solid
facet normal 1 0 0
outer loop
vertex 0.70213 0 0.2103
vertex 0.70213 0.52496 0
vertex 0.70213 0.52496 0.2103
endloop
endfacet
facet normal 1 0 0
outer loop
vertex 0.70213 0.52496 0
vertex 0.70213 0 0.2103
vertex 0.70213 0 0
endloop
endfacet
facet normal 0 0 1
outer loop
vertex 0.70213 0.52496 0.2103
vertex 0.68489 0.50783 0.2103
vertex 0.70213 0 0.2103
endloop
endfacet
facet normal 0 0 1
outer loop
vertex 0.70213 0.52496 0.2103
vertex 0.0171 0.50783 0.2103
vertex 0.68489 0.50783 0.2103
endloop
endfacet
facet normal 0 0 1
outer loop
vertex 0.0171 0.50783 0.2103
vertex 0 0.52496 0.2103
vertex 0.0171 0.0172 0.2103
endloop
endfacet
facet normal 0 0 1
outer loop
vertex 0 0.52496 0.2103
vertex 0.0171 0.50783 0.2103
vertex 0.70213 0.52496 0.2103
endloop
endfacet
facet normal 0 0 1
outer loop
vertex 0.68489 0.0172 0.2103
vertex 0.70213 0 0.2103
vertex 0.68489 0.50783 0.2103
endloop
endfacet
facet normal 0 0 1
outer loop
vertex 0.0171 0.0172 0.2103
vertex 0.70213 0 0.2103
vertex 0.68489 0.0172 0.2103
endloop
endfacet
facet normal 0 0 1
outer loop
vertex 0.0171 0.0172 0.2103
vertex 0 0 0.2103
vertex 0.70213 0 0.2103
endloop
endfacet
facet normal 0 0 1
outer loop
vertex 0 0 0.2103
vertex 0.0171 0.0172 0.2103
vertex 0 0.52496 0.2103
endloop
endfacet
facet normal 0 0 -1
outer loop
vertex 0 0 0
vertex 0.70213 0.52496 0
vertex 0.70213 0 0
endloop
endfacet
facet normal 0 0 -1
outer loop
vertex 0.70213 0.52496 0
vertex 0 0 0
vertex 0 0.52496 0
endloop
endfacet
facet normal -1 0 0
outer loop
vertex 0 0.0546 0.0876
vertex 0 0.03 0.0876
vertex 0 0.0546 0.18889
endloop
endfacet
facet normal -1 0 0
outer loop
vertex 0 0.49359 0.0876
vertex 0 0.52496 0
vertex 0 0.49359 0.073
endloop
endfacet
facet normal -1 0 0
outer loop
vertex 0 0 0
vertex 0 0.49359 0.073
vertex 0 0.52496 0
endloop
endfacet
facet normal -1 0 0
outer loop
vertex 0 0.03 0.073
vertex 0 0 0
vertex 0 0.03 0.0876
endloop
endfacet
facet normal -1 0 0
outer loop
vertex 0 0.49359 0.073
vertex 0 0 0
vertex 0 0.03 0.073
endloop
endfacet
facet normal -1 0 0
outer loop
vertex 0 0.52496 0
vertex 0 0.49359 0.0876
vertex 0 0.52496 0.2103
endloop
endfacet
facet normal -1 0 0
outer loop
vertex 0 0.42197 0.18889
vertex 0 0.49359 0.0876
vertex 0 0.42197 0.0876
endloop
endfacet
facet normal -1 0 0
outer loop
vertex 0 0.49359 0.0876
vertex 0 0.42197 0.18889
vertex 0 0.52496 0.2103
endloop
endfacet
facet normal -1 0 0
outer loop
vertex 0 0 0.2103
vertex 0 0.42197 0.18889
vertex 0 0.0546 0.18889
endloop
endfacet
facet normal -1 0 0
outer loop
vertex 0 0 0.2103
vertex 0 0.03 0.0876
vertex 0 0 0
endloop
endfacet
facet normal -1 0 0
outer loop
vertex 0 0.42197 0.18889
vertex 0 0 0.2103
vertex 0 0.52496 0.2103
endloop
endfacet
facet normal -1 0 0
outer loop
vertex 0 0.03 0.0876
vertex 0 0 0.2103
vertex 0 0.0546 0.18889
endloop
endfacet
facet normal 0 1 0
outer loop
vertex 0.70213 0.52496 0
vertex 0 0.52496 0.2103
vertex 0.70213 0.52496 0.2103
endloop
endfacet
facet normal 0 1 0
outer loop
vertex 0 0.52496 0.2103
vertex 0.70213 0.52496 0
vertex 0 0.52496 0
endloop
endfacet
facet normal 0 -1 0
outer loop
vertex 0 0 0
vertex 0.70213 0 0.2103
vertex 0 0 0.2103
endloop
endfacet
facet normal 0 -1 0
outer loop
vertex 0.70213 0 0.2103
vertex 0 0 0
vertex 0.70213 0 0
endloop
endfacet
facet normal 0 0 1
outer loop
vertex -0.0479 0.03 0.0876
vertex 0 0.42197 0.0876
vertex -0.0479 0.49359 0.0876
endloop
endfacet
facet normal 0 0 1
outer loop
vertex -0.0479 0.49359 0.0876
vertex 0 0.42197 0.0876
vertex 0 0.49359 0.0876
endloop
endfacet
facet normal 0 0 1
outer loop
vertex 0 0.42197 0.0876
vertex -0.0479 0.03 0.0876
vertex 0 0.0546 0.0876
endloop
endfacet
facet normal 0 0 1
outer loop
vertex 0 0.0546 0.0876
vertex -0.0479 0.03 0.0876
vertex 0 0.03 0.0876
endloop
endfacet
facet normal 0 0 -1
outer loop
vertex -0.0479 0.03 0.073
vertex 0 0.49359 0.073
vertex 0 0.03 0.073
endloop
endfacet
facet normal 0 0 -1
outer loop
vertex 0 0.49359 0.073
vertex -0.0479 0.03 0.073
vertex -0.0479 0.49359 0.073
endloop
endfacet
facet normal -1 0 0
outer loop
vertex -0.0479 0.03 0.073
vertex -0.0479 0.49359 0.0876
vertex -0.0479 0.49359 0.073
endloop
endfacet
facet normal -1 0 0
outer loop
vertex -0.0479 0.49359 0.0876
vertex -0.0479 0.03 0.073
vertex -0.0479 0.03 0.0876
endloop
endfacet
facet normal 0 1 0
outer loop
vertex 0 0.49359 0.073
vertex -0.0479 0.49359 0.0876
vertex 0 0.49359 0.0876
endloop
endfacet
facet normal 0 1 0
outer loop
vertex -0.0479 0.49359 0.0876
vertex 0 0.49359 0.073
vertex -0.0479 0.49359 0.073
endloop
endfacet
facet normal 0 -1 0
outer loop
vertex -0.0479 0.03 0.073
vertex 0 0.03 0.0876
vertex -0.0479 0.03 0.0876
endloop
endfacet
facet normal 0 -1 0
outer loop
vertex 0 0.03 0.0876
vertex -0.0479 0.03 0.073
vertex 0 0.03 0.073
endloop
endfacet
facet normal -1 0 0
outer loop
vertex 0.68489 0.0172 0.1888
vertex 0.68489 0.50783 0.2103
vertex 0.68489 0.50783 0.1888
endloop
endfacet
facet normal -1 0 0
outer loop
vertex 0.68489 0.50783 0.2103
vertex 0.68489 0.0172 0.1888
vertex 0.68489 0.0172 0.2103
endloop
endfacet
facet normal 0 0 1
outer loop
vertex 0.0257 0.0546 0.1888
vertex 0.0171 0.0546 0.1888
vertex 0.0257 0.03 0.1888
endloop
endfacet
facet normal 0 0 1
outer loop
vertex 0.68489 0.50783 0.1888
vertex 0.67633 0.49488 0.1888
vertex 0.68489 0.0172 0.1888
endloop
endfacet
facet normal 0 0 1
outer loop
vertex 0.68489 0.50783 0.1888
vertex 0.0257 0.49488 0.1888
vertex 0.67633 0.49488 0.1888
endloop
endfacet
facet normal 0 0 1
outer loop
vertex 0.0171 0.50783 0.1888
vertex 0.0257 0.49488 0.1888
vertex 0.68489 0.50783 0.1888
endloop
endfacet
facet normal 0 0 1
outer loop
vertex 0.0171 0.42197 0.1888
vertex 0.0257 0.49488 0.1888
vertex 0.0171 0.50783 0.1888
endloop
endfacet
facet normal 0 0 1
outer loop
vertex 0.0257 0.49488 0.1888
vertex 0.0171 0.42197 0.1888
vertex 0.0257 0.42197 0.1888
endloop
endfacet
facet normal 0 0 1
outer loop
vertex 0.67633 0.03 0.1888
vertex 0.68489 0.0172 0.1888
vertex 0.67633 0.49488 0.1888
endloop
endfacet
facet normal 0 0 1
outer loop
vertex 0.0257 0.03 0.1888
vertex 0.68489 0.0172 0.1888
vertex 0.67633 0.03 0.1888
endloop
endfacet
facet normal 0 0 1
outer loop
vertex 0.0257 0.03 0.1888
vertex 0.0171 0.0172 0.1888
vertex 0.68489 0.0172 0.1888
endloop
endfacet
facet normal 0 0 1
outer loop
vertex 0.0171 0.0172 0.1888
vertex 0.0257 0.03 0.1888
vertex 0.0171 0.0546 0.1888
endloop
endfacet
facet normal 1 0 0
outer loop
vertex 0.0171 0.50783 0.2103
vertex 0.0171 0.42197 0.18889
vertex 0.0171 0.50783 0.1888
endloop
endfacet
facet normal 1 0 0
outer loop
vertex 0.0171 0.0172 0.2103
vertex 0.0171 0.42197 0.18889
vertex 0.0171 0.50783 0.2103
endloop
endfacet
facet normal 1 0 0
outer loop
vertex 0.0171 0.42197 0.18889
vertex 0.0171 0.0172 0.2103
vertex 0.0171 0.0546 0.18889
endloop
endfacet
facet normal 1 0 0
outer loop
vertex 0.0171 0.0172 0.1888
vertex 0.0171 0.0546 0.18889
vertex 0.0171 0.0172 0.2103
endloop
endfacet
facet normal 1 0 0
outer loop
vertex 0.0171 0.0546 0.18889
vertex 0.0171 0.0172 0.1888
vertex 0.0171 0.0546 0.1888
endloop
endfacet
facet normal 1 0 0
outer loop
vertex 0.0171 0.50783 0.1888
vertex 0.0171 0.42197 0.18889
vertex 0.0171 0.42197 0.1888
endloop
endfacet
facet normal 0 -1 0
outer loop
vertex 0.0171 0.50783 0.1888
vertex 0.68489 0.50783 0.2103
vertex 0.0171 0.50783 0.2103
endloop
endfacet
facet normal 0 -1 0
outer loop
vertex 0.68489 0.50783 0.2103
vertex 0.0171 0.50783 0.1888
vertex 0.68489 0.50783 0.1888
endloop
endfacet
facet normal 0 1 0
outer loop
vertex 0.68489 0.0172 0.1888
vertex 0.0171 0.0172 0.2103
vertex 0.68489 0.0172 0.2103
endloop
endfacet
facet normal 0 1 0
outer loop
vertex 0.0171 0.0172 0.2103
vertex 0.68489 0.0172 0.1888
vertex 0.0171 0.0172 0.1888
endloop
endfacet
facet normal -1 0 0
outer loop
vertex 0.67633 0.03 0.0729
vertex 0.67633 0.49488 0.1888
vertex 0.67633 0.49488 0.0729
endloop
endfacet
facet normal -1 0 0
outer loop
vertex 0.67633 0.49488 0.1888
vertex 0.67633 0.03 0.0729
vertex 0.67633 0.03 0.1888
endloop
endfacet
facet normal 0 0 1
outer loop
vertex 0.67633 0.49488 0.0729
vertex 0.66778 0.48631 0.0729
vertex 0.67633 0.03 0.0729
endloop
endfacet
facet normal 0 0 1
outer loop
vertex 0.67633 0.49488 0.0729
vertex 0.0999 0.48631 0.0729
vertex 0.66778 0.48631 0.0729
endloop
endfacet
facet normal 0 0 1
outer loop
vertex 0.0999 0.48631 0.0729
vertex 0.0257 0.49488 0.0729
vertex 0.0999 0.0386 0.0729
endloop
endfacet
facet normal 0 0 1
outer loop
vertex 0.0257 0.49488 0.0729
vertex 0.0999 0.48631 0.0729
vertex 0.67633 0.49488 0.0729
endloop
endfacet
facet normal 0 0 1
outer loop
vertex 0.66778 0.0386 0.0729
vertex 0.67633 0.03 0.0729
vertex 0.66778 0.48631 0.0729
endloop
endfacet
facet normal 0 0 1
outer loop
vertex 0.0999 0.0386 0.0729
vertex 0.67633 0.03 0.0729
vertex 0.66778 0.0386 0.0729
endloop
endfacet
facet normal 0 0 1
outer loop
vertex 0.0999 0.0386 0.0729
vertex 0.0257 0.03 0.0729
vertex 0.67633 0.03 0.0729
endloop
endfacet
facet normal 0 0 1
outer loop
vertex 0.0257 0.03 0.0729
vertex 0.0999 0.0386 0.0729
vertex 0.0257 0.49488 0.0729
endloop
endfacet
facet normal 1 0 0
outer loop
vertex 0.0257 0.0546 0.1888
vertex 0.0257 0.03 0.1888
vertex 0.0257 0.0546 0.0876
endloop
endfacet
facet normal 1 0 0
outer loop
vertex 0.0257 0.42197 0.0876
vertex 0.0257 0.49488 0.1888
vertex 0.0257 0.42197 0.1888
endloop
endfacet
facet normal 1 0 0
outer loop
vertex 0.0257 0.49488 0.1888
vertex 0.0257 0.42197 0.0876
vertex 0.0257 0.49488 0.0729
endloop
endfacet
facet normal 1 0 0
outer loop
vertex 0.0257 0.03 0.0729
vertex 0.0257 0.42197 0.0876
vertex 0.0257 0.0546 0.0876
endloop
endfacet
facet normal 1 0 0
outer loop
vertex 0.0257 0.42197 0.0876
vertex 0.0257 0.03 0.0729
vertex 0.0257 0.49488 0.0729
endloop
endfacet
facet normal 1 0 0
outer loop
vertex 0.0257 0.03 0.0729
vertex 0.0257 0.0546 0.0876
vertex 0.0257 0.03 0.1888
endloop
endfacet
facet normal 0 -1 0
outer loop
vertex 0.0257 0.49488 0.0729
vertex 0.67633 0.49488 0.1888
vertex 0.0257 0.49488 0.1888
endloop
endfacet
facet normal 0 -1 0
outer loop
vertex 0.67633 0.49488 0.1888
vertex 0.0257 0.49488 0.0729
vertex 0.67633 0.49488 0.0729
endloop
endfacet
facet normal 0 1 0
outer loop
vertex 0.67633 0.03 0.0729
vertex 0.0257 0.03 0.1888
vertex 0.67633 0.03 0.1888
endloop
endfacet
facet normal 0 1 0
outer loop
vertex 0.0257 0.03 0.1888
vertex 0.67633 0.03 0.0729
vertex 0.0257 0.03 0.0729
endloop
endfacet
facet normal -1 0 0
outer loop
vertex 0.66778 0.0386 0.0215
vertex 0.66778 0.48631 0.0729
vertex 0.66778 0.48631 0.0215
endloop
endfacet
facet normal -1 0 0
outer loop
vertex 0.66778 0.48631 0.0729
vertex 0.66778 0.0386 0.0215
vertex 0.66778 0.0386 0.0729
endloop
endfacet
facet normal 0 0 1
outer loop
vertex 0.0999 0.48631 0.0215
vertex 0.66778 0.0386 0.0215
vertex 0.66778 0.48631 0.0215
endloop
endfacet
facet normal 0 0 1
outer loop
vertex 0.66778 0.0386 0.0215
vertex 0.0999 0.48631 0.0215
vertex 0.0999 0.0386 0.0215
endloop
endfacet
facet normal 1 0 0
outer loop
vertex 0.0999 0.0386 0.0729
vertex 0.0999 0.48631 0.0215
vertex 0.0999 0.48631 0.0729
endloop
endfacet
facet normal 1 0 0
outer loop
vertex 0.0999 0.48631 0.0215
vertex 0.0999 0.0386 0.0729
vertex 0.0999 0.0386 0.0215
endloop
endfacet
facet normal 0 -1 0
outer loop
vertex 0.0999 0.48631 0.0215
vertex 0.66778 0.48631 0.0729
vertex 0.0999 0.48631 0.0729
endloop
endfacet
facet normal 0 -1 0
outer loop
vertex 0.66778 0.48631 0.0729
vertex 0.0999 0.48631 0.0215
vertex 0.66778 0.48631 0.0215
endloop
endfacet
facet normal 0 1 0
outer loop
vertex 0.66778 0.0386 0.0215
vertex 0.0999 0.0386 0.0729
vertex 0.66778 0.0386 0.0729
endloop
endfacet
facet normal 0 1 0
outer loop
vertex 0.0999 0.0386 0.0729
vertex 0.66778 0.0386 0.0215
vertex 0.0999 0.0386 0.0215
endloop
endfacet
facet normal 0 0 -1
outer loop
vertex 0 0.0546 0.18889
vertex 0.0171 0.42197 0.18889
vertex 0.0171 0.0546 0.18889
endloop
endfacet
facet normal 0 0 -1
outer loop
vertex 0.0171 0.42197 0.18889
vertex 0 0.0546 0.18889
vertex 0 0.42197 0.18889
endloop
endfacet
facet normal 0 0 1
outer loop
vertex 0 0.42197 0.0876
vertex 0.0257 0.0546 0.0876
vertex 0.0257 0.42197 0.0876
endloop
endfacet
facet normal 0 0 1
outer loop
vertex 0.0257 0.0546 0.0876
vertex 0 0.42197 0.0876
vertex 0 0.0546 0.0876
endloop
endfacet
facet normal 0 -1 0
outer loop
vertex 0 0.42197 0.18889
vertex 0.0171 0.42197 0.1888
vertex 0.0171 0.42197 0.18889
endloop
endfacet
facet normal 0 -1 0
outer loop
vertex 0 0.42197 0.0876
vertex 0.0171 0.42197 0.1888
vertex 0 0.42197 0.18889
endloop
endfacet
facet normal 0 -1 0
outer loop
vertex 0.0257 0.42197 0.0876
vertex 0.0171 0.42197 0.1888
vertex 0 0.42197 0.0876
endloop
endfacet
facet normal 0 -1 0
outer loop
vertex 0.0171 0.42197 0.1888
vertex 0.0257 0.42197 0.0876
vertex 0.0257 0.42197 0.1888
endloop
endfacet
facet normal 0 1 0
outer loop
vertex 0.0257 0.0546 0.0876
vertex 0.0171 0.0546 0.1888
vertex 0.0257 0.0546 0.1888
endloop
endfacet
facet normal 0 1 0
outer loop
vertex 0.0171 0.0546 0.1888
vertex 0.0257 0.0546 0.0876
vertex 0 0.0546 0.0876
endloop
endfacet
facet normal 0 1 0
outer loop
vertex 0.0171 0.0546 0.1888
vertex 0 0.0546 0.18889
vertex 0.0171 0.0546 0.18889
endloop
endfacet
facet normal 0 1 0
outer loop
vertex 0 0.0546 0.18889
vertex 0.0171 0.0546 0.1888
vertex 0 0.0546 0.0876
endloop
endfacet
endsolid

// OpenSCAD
// OpenSCAD parametric model
// Units: millimeters
// Coordinate system:
// X = length, left edge to right edge
// Y = width, front edge to back edge
// Z = height, underside to top

$fn = 64;
eps = 0.000001;

// Main reference body
body_l = 0.702127;
body_w = 0.524964;
body_h = 0.2103;

// Top shallow rectangular recess
top_recess_l = 0.667793;
top_recess_w = 0.490631;
top_recess_left_inset = 0.0171;
top_recess_right_inset = 0.0172;
top_recess_front_inset = 0.0172;
top_recess_back_inset = 0.0172;
top_recess_z_start = 0.1888;
top_recess_depth = 0.0215;

// Middle contained rectangular cut
middle_cut_l = 0.650626;
middle_cut_w = 0.46488;
middle_cut_left_inset = 0.0257;
middle_cut_right_inset = 0.0258;
middle_cut_front_inset = 0.03;
middle_cut_back_inset = 0.0301;
middle_cut_z_start = 0.0729;
middle_cut_depth = 0.1159;

// Lower offset rectangular pocket
lower_pocket_l = 0.567882;
lower_pocket_w = 0.447713;
lower_pocket_left_inset = 0.0999;
lower_pocket_right_inset = 0.0343;
lower_pocket_front_inset = 0.0386;
lower_pocket_back_inset = 0.0387;
lower_pocket_z_start = 0.0215;
lower_pocket_depth = 0.0515;

// Left side solid projection
side_projection_l = 0.130618;
side_projection_w = 0.463588;
side_projection_left_overhang = 0.0479;
side_projection_right_remain = 0.6194;
side_projection_front_inset = 0.03;
side_projection_back_inset = 0.0314;
side_projection_z_start = 0.073;
side_projection_thickness = 0.0146;

// Left side recess
side_recess_depth = 0.0343;
side_recess_face_length = 0.367372;
side_recess_front_inset = 0.0546;
side_recess_back_inset = 0.103;
side_recess_z_start = 0.0876;
side_recess_face_height = 0.101285;

// Helper module for rectangular cuts
module rectangular_cut(x, y, z, l, w, h) {
    translate([x, y, z]) {
        cube([l, w, h]);
    }
}

difference(convexity = 10) {
    union() {
        // Main rectangular solid
        cube([body_l, body_w, body_h]);

        // Added left side projection, lower band
        translate([
            -side_projection_left_overhang,
            side_projection_front_inset,
            side_projection_z_start
        ]) {
            cube([
                side_projection_l,
                side_projection_w,
                side_projection_thickness + eps
            ]);
        }
    }

    union() {
        // Top shallow recess, vertical band 0.1888 to 0.2103
        rectangular_cut(
            top_recess_left_inset,
            top_recess_front_inset,
            top_recess_z_start,
            top_recess_l,
            top_recess_w,
            top_recess_depth + eps
        );

        // Middle contained cut, vertical band 0.0729 to 0.1888
        rectangular_cut(
            middle_cut_left_inset,
            middle_cut_front_inset,
            middle_cut_z_start,
            middle_cut_l,
            middle_cut_w,
            middle_cut_depth + eps
        );

        // Lower offset pocket, vertical band 0.0215 to 0.073
        rectangular_cut(
            lower_pocket_left_inset,
            lower_pocket_front_inset,
            lower_pocket_z_start,
            lower_pocket_l,
            lower_pocket_w,
            lower_pocket_depth + eps
        );

        // Left side recess, vertical band above projection
        rectangular_cut(
            -eps,
            side_recess_front_inset,
            side_recess_z_start - eps,
            side_recess_depth + 2 * eps,
            side_recess_face_length,
            side_recess_face_height + 2 * eps
        );
    }
}
